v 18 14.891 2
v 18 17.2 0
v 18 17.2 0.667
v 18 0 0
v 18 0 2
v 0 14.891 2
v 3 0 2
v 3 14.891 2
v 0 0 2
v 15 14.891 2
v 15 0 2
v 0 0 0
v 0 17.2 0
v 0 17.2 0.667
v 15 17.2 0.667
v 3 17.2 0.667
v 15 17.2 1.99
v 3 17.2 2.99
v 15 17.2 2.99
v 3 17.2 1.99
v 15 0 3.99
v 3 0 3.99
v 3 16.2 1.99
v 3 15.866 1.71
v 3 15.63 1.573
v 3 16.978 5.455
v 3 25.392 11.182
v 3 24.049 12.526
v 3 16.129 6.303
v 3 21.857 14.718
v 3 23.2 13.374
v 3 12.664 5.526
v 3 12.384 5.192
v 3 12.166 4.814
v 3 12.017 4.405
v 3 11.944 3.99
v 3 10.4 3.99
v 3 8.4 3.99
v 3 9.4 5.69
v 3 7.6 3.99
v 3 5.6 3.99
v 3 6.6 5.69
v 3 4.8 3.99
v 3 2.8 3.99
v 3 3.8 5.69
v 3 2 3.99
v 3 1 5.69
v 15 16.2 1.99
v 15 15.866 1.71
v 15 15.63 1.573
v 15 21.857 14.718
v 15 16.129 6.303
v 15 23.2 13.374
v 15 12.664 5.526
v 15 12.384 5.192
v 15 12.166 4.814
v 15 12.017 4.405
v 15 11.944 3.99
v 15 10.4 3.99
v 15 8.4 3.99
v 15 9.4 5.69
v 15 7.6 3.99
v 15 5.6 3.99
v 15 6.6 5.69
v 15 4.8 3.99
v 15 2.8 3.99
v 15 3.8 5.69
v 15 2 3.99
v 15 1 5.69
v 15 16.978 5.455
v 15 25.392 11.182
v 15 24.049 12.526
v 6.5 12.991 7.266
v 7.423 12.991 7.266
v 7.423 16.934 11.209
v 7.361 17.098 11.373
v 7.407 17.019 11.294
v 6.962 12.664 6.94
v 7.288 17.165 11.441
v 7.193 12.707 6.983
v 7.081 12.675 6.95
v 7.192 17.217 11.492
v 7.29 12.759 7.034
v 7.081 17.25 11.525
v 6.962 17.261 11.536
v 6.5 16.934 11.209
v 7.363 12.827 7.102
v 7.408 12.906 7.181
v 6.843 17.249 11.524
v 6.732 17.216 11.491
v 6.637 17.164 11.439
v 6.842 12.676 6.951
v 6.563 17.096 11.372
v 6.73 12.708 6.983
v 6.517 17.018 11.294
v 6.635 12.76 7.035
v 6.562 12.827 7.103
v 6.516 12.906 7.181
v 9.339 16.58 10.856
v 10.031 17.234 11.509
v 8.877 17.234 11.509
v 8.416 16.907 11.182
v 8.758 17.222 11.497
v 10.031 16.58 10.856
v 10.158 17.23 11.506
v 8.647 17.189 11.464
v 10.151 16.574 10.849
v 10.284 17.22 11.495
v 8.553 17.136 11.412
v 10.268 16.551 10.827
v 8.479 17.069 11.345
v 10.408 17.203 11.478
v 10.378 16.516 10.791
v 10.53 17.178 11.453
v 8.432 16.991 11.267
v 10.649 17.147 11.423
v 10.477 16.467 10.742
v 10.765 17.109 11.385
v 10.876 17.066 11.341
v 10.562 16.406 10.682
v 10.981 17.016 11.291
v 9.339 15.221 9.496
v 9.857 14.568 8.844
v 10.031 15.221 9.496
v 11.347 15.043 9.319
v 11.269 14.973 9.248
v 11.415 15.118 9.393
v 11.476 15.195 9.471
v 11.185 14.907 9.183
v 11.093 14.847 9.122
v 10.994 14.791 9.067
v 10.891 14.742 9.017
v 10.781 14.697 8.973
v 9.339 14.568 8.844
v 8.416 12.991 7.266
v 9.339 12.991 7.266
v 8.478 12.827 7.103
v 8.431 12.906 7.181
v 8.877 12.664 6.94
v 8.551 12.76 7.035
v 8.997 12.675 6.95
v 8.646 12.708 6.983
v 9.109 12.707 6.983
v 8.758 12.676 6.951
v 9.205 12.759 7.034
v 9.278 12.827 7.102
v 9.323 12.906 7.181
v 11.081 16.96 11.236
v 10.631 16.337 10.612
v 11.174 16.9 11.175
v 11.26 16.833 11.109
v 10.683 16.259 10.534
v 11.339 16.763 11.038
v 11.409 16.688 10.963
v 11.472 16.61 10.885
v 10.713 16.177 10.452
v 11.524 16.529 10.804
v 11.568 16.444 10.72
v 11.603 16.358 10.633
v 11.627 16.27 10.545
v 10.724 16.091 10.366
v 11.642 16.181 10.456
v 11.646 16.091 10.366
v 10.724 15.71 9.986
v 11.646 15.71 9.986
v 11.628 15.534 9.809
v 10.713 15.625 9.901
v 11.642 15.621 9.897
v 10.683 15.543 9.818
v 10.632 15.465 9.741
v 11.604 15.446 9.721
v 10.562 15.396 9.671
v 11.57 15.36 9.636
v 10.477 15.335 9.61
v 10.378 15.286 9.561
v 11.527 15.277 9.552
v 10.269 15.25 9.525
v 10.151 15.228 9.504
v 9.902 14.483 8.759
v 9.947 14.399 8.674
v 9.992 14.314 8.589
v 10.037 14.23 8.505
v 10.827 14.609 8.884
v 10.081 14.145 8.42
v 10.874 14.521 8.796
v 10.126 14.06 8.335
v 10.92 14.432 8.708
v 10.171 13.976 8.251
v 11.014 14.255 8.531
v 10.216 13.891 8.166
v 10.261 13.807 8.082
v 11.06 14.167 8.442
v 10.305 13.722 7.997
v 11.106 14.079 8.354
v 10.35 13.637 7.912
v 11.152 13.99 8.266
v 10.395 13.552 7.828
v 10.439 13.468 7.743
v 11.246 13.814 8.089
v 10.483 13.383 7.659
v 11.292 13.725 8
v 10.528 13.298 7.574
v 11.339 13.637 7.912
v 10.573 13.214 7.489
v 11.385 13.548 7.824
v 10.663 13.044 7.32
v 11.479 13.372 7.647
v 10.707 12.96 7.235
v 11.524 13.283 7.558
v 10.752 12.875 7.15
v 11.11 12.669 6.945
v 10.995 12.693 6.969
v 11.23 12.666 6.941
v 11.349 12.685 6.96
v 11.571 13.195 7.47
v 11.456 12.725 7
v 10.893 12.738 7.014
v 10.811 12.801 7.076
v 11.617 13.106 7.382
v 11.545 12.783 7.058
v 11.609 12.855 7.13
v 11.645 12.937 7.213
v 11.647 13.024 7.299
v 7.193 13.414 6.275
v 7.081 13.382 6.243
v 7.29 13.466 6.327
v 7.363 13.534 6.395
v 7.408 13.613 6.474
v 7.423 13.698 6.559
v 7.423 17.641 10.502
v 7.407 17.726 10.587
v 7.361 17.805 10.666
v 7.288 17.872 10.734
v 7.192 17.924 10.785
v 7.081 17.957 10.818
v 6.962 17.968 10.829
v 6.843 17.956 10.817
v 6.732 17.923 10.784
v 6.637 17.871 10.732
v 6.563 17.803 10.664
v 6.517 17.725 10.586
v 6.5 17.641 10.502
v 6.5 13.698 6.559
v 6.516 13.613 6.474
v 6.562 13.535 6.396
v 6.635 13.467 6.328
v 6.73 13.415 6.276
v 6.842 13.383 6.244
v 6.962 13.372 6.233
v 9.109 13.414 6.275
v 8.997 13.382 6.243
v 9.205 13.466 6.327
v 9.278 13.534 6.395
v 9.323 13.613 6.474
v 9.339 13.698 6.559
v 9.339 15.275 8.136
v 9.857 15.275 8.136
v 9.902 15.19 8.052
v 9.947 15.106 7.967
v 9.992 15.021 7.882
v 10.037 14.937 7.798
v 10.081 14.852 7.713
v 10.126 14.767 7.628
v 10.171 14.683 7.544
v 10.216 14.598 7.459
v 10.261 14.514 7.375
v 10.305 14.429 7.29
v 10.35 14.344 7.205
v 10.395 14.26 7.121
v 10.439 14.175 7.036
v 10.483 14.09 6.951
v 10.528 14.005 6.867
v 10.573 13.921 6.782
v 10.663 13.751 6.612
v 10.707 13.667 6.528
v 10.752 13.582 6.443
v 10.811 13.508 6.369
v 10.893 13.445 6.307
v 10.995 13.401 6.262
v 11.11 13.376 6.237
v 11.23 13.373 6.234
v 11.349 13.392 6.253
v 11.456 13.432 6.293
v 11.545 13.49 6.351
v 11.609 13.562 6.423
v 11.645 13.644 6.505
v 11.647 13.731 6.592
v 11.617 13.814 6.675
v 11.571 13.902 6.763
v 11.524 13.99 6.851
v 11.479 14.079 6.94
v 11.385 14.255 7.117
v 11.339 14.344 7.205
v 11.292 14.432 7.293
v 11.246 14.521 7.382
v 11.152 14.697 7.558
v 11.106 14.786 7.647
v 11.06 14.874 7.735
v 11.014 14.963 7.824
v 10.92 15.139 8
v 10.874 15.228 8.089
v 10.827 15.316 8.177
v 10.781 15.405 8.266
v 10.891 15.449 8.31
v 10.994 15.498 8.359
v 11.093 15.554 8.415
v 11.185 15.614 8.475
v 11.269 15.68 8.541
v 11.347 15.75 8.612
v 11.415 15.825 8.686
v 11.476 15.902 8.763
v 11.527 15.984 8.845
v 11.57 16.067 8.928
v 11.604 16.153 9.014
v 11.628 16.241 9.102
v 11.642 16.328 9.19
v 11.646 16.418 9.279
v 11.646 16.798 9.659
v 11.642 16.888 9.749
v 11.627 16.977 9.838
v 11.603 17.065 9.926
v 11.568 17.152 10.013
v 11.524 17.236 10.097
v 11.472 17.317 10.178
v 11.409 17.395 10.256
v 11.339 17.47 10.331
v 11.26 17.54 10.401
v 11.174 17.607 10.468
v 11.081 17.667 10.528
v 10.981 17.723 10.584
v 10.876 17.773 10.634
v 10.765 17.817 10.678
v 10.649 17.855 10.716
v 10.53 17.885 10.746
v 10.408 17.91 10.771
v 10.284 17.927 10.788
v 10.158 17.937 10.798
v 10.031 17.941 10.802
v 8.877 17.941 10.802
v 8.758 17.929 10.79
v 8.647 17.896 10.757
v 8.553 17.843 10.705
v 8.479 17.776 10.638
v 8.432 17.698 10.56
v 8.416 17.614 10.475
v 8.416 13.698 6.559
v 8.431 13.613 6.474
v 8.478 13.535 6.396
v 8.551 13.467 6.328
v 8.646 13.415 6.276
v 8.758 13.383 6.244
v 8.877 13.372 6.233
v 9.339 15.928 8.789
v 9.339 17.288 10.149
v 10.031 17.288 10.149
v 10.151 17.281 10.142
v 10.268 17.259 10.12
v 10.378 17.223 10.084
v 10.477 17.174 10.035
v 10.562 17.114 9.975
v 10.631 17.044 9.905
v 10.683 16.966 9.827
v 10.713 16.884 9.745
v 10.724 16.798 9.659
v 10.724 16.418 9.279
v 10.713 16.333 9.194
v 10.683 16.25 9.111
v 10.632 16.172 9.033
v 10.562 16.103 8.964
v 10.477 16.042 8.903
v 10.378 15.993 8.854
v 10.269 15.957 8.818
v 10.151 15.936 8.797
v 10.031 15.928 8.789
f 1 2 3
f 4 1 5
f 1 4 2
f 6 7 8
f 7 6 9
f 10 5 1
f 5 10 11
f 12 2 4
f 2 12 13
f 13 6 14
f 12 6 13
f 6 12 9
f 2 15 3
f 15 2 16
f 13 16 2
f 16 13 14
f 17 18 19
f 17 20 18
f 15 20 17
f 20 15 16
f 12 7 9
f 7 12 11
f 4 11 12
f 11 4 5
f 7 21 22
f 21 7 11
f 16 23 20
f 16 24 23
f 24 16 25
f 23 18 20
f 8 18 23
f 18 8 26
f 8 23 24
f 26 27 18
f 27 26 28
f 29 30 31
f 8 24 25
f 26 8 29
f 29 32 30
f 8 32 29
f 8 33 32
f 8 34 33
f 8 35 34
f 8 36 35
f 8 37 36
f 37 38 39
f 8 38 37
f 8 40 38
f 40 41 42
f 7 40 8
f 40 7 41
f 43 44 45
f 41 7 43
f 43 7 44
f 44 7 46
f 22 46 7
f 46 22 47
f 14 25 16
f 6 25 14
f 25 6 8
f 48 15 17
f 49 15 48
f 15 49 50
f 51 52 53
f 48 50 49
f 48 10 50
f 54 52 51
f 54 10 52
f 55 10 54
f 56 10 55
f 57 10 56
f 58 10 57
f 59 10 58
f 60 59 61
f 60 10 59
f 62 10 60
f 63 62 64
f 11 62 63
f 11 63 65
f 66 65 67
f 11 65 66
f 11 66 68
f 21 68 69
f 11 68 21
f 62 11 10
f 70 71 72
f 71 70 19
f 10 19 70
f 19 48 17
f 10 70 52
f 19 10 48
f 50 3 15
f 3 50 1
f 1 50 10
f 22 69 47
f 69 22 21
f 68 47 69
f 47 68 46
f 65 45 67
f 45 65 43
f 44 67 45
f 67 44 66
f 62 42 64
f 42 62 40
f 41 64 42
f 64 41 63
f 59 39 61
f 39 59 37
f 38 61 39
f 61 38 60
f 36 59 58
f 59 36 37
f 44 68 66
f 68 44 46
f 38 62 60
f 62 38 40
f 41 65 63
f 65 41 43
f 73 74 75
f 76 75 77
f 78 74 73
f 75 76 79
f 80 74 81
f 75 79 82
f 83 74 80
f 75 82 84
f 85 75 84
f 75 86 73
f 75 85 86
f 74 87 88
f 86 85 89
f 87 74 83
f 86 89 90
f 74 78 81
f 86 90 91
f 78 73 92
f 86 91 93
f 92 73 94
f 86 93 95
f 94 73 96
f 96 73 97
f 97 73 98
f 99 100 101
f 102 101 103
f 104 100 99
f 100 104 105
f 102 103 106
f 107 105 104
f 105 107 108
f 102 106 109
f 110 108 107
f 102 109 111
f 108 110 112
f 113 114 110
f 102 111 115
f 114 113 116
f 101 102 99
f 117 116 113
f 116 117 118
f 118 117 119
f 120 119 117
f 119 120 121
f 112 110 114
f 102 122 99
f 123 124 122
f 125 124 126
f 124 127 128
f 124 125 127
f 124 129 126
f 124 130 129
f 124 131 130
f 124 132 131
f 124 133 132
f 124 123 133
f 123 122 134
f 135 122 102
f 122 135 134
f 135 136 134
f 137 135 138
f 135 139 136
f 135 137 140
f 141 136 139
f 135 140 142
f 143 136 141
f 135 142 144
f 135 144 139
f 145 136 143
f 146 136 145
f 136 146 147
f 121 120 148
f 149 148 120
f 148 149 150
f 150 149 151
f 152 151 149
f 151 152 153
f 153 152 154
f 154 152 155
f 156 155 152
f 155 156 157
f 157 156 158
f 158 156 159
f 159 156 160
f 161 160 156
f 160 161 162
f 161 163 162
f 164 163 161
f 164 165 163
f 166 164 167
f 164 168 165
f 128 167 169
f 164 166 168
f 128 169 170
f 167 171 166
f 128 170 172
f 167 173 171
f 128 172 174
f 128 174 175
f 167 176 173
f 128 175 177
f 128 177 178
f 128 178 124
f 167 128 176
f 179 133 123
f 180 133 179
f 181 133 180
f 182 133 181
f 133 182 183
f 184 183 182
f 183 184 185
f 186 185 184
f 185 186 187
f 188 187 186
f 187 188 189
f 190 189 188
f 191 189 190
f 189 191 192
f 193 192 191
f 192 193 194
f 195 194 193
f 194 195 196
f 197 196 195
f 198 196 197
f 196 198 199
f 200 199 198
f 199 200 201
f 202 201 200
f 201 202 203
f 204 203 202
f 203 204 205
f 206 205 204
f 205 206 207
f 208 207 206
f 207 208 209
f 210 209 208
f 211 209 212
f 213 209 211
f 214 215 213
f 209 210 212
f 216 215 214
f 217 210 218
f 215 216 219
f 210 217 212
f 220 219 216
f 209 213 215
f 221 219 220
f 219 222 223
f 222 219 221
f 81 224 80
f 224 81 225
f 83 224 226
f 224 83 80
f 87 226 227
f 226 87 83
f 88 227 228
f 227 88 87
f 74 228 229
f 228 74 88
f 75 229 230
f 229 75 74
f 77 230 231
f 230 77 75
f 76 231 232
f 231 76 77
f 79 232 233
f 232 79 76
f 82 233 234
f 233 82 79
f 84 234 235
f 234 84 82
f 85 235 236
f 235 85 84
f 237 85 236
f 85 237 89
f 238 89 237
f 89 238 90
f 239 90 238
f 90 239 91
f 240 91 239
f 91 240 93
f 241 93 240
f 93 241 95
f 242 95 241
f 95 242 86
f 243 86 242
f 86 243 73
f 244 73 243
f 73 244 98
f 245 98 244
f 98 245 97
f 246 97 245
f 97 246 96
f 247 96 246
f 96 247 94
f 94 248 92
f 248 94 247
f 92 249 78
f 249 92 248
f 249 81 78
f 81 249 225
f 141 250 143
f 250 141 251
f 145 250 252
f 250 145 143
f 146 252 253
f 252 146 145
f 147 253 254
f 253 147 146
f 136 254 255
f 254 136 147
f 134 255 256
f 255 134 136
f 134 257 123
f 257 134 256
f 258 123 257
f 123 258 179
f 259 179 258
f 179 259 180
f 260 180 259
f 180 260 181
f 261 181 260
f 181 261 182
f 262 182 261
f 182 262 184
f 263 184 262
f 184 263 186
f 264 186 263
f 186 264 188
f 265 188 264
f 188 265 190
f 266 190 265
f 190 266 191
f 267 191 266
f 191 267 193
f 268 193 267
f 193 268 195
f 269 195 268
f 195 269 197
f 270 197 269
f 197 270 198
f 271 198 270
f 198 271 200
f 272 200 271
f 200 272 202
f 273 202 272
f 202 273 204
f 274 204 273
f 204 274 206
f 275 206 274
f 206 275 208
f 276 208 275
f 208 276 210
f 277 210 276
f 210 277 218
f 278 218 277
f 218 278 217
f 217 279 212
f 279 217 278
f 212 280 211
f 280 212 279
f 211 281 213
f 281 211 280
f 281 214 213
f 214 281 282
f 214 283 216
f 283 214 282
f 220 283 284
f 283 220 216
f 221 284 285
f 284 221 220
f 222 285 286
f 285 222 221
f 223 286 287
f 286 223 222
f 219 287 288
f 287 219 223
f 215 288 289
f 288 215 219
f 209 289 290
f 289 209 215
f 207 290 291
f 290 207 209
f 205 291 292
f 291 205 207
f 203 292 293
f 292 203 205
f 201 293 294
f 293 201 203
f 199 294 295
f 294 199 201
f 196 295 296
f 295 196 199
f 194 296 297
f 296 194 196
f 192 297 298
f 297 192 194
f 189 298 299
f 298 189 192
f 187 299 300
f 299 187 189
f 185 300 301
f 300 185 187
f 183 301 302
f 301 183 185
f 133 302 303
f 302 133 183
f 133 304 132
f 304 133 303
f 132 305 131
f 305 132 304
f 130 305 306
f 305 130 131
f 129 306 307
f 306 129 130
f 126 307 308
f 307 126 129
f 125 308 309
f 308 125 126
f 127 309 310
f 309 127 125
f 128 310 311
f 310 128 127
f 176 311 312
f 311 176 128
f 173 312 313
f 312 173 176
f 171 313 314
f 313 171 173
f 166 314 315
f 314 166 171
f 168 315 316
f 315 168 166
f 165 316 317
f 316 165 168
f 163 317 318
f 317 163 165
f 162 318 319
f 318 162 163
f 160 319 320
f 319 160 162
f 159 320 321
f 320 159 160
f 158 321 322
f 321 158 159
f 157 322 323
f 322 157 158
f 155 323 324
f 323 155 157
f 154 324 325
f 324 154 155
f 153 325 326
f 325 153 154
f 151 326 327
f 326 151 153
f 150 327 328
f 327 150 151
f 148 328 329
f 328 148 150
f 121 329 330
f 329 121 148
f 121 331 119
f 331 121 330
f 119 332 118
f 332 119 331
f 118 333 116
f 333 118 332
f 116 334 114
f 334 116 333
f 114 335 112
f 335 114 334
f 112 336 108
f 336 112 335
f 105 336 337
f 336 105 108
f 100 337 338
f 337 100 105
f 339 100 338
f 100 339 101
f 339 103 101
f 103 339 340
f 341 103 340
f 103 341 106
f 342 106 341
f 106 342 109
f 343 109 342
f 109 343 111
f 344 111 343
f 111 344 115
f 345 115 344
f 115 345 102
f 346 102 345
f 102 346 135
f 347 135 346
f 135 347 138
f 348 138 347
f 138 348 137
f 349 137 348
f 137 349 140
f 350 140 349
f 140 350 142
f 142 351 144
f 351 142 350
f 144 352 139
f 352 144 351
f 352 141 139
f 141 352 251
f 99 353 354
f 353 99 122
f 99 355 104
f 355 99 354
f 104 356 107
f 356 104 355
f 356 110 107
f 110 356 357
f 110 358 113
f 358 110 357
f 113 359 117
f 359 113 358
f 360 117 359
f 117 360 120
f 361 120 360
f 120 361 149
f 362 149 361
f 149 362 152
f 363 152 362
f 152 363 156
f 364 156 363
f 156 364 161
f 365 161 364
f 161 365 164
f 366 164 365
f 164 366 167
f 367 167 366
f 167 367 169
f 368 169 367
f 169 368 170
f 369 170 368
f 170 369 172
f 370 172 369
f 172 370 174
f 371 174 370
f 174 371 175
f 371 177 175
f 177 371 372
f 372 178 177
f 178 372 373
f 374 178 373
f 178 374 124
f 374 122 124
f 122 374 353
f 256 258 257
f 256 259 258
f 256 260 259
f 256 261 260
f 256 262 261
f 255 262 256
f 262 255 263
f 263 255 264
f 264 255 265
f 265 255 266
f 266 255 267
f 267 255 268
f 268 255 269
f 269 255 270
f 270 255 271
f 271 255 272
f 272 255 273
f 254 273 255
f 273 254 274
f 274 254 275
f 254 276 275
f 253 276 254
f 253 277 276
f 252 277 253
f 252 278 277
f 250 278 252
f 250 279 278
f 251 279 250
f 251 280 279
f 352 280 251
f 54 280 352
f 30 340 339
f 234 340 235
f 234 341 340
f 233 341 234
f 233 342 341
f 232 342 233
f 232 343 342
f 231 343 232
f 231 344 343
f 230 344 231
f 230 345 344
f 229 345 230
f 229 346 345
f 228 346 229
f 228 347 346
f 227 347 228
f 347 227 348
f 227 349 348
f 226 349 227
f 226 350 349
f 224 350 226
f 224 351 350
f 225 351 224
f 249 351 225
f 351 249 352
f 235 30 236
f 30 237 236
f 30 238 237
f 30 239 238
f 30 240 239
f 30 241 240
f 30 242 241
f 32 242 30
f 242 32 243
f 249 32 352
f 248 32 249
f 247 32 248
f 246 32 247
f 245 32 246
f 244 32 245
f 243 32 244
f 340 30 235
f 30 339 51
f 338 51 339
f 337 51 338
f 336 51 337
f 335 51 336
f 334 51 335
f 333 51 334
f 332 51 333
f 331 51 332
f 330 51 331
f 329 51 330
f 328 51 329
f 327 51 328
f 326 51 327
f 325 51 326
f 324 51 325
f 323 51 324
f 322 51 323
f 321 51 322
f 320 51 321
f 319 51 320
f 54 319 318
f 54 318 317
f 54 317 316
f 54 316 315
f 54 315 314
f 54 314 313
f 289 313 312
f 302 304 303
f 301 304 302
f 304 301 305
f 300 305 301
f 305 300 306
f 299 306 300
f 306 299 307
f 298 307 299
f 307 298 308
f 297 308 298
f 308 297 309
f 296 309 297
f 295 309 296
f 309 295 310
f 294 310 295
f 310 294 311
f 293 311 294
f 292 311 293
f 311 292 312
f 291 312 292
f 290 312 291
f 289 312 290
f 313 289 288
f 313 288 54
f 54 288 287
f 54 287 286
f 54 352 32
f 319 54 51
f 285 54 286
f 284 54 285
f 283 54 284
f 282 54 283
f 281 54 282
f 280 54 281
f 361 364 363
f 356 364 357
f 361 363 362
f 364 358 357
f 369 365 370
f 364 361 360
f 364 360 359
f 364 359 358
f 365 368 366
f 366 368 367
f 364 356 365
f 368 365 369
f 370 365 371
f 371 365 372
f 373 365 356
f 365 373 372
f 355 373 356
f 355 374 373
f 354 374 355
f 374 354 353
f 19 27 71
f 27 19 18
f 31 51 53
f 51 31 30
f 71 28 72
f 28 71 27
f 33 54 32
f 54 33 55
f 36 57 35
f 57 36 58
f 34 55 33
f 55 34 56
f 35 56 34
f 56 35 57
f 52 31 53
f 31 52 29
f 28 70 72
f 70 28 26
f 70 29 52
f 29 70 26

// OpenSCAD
hs_w      = 18.0;
hs_l      = 17.2;
hs_h      = 2;
hs2_w     = 12;
hs2_l     = hs_l;
hs2_h     = 2;
hs2_x_off = (hs_w-hs2_w)/2;
hs3_l     = 13;
hs3_h     = 5;
hs3_w     = 1.2;

module hotshoe() {
    union() {
        difference() {
            cube([hs_w, hs_l, hs_h]);
            translate([-1,hs_l,hs_h/3]) rotate([60,0,0]) cube([hs2_x_off+1, 10,10]);
            translate([hs2_x_off+hs2_w,hs_l,hs_h/3]) rotate([60,0,0]) cube([hs2_x_off+1, 10,10]);
        }
        translate([hs2_x_off, 0, hs_h-0.01]) {
            cube([hs2_w, hs2_l, hs2_h]);
            for ( i = [0:3]) 
                //translate([0,1+i*1.8,hs2_h]) rotate([0,90,0]) rotate([0,0,30]) cylinder(h=hs2_w, $fn=3);
                #translate([hs2_w/2,1+2.8*(i),hs2_h]) scale([1,1,1.7]) rotate([45,0,0]) cube([hs2_w,sqrt(2), sqrt(2)], center=true);
        }
        translate([hs2_x_off, hs2_l-1, hs_h-0.01])
        rotate([45,0,0])
        difference() {
            union() {
                translate([3.5,1,hs3_h-1]) linear_extrude(height=1+1) import(file="IR.dxf", layer="initials");
                cube([hs2_w, hs3_l, hs3_h]);
                translate([0,0,hs3_h/2]) rotate([0,90,0]) cylinder(h=hs2_w, r=hs3_h/2, $fn=36);
            }
            translate([-1,3,(hs3_h-hs3_w)/2]) cube([hs2_w+2, hs3_l, hs3_w]);
        }
    }
}

hotshoe();
